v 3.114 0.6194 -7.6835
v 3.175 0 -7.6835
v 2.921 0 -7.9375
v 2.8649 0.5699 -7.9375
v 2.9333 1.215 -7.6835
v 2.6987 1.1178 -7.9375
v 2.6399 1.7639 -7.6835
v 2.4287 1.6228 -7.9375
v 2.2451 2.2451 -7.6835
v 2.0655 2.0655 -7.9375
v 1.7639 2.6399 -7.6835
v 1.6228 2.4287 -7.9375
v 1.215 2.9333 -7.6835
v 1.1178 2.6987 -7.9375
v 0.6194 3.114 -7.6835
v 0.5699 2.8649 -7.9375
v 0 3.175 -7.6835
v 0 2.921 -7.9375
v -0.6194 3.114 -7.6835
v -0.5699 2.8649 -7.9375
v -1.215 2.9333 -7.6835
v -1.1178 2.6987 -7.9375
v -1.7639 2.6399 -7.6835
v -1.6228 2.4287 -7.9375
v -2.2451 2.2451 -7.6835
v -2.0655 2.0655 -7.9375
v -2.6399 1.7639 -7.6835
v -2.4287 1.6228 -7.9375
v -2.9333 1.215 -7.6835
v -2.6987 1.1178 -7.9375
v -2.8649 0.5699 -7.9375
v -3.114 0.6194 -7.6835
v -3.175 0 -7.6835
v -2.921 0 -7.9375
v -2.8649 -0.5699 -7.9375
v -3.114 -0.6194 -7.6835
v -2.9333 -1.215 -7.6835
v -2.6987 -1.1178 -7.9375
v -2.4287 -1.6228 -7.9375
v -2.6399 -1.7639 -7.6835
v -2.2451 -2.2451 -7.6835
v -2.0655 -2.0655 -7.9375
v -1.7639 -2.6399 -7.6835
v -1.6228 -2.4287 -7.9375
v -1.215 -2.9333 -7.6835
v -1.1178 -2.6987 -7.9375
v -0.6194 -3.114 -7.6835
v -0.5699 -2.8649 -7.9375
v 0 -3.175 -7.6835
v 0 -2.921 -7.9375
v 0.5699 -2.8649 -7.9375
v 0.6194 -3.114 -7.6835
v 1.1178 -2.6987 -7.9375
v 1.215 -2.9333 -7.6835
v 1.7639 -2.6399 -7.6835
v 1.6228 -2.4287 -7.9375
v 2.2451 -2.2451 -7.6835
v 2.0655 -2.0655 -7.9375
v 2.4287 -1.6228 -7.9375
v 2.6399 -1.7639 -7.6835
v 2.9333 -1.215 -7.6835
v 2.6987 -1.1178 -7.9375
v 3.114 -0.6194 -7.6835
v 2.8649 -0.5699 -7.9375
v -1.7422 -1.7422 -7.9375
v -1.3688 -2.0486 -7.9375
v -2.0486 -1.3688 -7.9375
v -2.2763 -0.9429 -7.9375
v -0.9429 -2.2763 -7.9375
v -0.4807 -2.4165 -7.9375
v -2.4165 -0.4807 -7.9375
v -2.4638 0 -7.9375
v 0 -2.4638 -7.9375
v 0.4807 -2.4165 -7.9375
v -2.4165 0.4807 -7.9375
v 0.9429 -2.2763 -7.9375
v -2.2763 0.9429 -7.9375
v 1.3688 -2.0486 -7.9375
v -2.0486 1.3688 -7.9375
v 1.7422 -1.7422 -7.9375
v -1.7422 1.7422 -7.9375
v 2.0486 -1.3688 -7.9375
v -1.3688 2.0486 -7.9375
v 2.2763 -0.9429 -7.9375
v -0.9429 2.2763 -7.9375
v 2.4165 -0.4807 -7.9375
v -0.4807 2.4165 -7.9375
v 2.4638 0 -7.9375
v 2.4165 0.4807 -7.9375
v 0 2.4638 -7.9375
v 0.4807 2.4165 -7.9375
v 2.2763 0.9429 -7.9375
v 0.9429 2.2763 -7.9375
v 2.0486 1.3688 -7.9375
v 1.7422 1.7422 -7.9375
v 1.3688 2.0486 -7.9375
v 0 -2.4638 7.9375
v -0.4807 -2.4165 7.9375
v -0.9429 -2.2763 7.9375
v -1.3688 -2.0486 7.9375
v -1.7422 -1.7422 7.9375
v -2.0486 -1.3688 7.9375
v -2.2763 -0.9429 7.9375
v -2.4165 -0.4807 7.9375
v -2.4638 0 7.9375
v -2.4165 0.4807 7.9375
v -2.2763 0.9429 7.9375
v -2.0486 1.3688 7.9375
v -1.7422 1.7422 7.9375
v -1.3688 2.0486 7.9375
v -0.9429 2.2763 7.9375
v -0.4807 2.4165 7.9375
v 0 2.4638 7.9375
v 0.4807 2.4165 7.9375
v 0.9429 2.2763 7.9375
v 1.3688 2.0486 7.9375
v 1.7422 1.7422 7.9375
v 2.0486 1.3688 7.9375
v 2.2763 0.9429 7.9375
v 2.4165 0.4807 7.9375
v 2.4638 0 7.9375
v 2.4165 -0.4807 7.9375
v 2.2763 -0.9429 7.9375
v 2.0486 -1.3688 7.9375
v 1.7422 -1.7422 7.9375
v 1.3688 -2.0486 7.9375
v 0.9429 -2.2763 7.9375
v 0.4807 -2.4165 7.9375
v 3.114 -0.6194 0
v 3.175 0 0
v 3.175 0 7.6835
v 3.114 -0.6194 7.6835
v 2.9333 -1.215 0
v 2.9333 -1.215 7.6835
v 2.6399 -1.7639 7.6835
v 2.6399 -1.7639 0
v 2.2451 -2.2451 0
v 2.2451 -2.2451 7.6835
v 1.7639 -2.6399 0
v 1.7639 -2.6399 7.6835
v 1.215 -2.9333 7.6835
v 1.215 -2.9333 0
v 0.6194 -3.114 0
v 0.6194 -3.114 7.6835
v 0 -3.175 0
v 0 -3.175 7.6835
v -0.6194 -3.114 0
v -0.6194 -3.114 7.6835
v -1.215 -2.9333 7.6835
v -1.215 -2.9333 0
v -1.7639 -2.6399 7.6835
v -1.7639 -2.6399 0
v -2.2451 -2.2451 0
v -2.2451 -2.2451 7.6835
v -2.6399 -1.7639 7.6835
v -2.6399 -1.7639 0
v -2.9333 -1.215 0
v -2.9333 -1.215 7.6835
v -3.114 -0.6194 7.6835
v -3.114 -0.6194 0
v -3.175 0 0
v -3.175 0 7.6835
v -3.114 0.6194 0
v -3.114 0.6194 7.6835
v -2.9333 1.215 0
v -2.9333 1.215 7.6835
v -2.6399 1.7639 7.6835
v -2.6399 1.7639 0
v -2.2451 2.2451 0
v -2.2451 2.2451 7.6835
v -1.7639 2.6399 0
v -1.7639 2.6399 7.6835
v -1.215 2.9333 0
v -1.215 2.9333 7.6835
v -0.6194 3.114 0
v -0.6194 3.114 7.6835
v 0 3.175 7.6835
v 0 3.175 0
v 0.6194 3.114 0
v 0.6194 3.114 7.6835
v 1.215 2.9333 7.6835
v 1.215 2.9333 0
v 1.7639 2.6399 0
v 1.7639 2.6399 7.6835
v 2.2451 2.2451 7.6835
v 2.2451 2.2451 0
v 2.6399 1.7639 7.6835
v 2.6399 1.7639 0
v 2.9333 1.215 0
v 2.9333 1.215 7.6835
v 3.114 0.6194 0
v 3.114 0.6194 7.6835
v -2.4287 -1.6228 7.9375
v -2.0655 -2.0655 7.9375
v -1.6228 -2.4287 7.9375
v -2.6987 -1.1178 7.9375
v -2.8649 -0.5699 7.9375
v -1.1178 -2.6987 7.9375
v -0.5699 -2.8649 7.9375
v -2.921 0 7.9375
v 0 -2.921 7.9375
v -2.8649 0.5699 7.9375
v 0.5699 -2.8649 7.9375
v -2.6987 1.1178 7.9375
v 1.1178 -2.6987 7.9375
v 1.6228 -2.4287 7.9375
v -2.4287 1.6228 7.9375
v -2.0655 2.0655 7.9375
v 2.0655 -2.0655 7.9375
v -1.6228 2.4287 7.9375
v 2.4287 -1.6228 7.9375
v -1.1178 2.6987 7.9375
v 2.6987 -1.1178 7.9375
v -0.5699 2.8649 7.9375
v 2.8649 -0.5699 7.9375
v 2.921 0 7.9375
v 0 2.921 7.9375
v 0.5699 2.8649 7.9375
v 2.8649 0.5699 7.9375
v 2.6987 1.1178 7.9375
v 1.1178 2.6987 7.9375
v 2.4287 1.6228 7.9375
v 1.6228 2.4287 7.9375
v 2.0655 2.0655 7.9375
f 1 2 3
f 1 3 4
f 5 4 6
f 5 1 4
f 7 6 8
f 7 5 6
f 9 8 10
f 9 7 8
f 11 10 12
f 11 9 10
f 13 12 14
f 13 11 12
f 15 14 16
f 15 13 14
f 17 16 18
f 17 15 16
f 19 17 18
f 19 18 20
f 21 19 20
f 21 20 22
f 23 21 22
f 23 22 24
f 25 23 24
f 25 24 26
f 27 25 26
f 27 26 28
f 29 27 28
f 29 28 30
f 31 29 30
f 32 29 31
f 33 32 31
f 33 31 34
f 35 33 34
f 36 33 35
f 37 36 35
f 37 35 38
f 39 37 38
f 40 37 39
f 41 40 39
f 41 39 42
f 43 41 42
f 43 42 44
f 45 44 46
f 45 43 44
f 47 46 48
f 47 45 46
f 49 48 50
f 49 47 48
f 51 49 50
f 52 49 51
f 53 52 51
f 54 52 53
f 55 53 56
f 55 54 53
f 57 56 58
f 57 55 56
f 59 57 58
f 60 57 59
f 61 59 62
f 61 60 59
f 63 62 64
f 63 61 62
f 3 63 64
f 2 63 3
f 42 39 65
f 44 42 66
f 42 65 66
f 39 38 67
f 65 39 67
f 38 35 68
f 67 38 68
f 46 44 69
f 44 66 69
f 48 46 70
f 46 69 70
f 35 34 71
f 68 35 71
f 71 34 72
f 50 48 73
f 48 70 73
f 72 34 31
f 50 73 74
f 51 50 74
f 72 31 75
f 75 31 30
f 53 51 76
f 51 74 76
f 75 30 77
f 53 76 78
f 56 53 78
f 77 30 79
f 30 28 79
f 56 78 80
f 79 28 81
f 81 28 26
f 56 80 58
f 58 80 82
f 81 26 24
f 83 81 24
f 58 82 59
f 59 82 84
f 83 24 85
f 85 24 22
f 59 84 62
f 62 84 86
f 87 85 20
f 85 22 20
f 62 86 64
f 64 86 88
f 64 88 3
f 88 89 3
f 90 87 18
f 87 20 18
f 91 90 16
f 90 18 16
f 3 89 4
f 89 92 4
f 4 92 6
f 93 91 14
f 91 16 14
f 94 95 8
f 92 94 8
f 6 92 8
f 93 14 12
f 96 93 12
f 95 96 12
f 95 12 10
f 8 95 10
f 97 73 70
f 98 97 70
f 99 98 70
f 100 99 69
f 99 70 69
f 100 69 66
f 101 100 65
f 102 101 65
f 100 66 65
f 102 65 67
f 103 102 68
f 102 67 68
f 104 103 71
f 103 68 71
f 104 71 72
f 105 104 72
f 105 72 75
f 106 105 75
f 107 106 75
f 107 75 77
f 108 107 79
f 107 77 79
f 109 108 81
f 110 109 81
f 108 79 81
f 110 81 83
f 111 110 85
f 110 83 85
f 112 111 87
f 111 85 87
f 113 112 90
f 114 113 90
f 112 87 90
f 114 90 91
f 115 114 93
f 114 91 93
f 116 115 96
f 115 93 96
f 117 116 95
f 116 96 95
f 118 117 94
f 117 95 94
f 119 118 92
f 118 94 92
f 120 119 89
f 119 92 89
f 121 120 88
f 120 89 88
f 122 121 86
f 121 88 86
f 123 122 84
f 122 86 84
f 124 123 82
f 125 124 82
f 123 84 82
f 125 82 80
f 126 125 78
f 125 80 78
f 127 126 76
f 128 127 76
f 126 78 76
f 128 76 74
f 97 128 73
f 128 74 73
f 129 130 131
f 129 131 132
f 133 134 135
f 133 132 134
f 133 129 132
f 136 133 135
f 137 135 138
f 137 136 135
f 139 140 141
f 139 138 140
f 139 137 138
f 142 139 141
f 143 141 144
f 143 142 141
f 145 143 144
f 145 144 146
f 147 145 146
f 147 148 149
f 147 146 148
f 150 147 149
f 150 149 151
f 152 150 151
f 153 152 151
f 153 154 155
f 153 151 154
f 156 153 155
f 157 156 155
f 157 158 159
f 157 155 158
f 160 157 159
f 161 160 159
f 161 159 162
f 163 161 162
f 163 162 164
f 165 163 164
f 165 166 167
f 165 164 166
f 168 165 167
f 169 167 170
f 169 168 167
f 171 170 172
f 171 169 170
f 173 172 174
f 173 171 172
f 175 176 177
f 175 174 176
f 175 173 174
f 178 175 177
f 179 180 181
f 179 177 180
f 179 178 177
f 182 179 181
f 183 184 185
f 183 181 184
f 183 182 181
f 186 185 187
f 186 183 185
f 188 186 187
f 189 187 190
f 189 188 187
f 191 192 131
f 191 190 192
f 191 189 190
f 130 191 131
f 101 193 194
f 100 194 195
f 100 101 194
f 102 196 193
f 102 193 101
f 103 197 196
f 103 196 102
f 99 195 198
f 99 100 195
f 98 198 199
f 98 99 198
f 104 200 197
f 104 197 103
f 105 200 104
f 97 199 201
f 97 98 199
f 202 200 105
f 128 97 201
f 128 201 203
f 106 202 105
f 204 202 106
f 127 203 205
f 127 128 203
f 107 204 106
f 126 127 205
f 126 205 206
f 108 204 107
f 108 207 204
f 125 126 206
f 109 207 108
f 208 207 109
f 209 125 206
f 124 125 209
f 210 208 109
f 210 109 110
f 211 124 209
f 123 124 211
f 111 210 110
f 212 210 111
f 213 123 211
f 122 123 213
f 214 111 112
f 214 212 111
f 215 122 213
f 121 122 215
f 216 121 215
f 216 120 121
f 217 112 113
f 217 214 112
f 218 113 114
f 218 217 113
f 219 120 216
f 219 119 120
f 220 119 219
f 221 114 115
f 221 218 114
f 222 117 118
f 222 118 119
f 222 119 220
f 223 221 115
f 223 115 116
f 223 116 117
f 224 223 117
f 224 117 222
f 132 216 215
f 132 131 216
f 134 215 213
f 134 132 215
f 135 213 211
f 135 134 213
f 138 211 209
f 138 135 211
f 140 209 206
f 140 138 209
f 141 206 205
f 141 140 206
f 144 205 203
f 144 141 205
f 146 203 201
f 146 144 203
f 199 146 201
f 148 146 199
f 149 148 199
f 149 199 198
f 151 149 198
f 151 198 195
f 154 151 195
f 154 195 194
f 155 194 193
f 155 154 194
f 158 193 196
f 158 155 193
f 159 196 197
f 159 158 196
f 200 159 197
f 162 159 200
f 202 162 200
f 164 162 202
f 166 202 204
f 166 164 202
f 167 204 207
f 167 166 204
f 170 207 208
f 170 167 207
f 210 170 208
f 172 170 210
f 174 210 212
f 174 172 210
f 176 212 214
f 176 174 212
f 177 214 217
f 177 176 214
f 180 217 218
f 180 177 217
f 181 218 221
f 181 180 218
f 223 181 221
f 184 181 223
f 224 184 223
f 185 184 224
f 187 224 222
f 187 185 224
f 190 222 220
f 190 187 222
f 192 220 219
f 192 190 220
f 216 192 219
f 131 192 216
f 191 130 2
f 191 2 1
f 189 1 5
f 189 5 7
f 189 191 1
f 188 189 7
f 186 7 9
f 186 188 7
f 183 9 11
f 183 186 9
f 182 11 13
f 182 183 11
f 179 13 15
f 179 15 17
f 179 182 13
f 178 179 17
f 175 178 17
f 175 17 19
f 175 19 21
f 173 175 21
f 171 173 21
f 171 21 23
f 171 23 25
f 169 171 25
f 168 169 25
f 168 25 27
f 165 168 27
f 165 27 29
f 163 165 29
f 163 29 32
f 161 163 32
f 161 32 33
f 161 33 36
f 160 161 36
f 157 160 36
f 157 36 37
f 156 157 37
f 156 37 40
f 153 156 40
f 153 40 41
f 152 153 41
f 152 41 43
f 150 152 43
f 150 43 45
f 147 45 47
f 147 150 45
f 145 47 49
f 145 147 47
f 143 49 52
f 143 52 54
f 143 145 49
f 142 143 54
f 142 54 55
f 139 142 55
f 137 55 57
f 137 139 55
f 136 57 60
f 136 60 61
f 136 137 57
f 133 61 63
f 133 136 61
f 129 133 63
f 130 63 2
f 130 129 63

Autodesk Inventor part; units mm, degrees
ref_plane "YZ Plane" through (0, 0, 0) normal (1, 0, 0) x (0, 1, 0)
ref_plane "XZ Plane" through (0, 0, 0) normal (0, 1, 0) x (-1, 0, 0)
ref_plane "XY Plane" through (0, 0, 0) normal (0, 0, 1) x (1, 0, 0)
sketch "Sketch1" plane through (0, 0, 0) normal (0, 0, 1) x (1, 0, 0)
  circle A0 centre (0, 0) radius 3.175
  dimension "d0" = 6.35
extrude "Extrusion1" add sketch "Sketch1" along normal mid plane 15.875
sketch "Sketch2" plane through (0, 0, 7.9375) normal (0, 0, 1) x (1, 0, 0)
  circle A0 centre (0, 0) radius 3.175 projected
hole "Hole1" at (0, 0, 7.9375) direction (0, 0, -1) diameter 4.9276 end through all
chamfer "Chamfer1" distance 0.254 angle 45 2 edges at (-3.175, 0, 7.9375) (-3.175, 0, -7.9375)
properties part number "Elevator Cascade Pulley Bearing Spacer" material "Aluminum"
